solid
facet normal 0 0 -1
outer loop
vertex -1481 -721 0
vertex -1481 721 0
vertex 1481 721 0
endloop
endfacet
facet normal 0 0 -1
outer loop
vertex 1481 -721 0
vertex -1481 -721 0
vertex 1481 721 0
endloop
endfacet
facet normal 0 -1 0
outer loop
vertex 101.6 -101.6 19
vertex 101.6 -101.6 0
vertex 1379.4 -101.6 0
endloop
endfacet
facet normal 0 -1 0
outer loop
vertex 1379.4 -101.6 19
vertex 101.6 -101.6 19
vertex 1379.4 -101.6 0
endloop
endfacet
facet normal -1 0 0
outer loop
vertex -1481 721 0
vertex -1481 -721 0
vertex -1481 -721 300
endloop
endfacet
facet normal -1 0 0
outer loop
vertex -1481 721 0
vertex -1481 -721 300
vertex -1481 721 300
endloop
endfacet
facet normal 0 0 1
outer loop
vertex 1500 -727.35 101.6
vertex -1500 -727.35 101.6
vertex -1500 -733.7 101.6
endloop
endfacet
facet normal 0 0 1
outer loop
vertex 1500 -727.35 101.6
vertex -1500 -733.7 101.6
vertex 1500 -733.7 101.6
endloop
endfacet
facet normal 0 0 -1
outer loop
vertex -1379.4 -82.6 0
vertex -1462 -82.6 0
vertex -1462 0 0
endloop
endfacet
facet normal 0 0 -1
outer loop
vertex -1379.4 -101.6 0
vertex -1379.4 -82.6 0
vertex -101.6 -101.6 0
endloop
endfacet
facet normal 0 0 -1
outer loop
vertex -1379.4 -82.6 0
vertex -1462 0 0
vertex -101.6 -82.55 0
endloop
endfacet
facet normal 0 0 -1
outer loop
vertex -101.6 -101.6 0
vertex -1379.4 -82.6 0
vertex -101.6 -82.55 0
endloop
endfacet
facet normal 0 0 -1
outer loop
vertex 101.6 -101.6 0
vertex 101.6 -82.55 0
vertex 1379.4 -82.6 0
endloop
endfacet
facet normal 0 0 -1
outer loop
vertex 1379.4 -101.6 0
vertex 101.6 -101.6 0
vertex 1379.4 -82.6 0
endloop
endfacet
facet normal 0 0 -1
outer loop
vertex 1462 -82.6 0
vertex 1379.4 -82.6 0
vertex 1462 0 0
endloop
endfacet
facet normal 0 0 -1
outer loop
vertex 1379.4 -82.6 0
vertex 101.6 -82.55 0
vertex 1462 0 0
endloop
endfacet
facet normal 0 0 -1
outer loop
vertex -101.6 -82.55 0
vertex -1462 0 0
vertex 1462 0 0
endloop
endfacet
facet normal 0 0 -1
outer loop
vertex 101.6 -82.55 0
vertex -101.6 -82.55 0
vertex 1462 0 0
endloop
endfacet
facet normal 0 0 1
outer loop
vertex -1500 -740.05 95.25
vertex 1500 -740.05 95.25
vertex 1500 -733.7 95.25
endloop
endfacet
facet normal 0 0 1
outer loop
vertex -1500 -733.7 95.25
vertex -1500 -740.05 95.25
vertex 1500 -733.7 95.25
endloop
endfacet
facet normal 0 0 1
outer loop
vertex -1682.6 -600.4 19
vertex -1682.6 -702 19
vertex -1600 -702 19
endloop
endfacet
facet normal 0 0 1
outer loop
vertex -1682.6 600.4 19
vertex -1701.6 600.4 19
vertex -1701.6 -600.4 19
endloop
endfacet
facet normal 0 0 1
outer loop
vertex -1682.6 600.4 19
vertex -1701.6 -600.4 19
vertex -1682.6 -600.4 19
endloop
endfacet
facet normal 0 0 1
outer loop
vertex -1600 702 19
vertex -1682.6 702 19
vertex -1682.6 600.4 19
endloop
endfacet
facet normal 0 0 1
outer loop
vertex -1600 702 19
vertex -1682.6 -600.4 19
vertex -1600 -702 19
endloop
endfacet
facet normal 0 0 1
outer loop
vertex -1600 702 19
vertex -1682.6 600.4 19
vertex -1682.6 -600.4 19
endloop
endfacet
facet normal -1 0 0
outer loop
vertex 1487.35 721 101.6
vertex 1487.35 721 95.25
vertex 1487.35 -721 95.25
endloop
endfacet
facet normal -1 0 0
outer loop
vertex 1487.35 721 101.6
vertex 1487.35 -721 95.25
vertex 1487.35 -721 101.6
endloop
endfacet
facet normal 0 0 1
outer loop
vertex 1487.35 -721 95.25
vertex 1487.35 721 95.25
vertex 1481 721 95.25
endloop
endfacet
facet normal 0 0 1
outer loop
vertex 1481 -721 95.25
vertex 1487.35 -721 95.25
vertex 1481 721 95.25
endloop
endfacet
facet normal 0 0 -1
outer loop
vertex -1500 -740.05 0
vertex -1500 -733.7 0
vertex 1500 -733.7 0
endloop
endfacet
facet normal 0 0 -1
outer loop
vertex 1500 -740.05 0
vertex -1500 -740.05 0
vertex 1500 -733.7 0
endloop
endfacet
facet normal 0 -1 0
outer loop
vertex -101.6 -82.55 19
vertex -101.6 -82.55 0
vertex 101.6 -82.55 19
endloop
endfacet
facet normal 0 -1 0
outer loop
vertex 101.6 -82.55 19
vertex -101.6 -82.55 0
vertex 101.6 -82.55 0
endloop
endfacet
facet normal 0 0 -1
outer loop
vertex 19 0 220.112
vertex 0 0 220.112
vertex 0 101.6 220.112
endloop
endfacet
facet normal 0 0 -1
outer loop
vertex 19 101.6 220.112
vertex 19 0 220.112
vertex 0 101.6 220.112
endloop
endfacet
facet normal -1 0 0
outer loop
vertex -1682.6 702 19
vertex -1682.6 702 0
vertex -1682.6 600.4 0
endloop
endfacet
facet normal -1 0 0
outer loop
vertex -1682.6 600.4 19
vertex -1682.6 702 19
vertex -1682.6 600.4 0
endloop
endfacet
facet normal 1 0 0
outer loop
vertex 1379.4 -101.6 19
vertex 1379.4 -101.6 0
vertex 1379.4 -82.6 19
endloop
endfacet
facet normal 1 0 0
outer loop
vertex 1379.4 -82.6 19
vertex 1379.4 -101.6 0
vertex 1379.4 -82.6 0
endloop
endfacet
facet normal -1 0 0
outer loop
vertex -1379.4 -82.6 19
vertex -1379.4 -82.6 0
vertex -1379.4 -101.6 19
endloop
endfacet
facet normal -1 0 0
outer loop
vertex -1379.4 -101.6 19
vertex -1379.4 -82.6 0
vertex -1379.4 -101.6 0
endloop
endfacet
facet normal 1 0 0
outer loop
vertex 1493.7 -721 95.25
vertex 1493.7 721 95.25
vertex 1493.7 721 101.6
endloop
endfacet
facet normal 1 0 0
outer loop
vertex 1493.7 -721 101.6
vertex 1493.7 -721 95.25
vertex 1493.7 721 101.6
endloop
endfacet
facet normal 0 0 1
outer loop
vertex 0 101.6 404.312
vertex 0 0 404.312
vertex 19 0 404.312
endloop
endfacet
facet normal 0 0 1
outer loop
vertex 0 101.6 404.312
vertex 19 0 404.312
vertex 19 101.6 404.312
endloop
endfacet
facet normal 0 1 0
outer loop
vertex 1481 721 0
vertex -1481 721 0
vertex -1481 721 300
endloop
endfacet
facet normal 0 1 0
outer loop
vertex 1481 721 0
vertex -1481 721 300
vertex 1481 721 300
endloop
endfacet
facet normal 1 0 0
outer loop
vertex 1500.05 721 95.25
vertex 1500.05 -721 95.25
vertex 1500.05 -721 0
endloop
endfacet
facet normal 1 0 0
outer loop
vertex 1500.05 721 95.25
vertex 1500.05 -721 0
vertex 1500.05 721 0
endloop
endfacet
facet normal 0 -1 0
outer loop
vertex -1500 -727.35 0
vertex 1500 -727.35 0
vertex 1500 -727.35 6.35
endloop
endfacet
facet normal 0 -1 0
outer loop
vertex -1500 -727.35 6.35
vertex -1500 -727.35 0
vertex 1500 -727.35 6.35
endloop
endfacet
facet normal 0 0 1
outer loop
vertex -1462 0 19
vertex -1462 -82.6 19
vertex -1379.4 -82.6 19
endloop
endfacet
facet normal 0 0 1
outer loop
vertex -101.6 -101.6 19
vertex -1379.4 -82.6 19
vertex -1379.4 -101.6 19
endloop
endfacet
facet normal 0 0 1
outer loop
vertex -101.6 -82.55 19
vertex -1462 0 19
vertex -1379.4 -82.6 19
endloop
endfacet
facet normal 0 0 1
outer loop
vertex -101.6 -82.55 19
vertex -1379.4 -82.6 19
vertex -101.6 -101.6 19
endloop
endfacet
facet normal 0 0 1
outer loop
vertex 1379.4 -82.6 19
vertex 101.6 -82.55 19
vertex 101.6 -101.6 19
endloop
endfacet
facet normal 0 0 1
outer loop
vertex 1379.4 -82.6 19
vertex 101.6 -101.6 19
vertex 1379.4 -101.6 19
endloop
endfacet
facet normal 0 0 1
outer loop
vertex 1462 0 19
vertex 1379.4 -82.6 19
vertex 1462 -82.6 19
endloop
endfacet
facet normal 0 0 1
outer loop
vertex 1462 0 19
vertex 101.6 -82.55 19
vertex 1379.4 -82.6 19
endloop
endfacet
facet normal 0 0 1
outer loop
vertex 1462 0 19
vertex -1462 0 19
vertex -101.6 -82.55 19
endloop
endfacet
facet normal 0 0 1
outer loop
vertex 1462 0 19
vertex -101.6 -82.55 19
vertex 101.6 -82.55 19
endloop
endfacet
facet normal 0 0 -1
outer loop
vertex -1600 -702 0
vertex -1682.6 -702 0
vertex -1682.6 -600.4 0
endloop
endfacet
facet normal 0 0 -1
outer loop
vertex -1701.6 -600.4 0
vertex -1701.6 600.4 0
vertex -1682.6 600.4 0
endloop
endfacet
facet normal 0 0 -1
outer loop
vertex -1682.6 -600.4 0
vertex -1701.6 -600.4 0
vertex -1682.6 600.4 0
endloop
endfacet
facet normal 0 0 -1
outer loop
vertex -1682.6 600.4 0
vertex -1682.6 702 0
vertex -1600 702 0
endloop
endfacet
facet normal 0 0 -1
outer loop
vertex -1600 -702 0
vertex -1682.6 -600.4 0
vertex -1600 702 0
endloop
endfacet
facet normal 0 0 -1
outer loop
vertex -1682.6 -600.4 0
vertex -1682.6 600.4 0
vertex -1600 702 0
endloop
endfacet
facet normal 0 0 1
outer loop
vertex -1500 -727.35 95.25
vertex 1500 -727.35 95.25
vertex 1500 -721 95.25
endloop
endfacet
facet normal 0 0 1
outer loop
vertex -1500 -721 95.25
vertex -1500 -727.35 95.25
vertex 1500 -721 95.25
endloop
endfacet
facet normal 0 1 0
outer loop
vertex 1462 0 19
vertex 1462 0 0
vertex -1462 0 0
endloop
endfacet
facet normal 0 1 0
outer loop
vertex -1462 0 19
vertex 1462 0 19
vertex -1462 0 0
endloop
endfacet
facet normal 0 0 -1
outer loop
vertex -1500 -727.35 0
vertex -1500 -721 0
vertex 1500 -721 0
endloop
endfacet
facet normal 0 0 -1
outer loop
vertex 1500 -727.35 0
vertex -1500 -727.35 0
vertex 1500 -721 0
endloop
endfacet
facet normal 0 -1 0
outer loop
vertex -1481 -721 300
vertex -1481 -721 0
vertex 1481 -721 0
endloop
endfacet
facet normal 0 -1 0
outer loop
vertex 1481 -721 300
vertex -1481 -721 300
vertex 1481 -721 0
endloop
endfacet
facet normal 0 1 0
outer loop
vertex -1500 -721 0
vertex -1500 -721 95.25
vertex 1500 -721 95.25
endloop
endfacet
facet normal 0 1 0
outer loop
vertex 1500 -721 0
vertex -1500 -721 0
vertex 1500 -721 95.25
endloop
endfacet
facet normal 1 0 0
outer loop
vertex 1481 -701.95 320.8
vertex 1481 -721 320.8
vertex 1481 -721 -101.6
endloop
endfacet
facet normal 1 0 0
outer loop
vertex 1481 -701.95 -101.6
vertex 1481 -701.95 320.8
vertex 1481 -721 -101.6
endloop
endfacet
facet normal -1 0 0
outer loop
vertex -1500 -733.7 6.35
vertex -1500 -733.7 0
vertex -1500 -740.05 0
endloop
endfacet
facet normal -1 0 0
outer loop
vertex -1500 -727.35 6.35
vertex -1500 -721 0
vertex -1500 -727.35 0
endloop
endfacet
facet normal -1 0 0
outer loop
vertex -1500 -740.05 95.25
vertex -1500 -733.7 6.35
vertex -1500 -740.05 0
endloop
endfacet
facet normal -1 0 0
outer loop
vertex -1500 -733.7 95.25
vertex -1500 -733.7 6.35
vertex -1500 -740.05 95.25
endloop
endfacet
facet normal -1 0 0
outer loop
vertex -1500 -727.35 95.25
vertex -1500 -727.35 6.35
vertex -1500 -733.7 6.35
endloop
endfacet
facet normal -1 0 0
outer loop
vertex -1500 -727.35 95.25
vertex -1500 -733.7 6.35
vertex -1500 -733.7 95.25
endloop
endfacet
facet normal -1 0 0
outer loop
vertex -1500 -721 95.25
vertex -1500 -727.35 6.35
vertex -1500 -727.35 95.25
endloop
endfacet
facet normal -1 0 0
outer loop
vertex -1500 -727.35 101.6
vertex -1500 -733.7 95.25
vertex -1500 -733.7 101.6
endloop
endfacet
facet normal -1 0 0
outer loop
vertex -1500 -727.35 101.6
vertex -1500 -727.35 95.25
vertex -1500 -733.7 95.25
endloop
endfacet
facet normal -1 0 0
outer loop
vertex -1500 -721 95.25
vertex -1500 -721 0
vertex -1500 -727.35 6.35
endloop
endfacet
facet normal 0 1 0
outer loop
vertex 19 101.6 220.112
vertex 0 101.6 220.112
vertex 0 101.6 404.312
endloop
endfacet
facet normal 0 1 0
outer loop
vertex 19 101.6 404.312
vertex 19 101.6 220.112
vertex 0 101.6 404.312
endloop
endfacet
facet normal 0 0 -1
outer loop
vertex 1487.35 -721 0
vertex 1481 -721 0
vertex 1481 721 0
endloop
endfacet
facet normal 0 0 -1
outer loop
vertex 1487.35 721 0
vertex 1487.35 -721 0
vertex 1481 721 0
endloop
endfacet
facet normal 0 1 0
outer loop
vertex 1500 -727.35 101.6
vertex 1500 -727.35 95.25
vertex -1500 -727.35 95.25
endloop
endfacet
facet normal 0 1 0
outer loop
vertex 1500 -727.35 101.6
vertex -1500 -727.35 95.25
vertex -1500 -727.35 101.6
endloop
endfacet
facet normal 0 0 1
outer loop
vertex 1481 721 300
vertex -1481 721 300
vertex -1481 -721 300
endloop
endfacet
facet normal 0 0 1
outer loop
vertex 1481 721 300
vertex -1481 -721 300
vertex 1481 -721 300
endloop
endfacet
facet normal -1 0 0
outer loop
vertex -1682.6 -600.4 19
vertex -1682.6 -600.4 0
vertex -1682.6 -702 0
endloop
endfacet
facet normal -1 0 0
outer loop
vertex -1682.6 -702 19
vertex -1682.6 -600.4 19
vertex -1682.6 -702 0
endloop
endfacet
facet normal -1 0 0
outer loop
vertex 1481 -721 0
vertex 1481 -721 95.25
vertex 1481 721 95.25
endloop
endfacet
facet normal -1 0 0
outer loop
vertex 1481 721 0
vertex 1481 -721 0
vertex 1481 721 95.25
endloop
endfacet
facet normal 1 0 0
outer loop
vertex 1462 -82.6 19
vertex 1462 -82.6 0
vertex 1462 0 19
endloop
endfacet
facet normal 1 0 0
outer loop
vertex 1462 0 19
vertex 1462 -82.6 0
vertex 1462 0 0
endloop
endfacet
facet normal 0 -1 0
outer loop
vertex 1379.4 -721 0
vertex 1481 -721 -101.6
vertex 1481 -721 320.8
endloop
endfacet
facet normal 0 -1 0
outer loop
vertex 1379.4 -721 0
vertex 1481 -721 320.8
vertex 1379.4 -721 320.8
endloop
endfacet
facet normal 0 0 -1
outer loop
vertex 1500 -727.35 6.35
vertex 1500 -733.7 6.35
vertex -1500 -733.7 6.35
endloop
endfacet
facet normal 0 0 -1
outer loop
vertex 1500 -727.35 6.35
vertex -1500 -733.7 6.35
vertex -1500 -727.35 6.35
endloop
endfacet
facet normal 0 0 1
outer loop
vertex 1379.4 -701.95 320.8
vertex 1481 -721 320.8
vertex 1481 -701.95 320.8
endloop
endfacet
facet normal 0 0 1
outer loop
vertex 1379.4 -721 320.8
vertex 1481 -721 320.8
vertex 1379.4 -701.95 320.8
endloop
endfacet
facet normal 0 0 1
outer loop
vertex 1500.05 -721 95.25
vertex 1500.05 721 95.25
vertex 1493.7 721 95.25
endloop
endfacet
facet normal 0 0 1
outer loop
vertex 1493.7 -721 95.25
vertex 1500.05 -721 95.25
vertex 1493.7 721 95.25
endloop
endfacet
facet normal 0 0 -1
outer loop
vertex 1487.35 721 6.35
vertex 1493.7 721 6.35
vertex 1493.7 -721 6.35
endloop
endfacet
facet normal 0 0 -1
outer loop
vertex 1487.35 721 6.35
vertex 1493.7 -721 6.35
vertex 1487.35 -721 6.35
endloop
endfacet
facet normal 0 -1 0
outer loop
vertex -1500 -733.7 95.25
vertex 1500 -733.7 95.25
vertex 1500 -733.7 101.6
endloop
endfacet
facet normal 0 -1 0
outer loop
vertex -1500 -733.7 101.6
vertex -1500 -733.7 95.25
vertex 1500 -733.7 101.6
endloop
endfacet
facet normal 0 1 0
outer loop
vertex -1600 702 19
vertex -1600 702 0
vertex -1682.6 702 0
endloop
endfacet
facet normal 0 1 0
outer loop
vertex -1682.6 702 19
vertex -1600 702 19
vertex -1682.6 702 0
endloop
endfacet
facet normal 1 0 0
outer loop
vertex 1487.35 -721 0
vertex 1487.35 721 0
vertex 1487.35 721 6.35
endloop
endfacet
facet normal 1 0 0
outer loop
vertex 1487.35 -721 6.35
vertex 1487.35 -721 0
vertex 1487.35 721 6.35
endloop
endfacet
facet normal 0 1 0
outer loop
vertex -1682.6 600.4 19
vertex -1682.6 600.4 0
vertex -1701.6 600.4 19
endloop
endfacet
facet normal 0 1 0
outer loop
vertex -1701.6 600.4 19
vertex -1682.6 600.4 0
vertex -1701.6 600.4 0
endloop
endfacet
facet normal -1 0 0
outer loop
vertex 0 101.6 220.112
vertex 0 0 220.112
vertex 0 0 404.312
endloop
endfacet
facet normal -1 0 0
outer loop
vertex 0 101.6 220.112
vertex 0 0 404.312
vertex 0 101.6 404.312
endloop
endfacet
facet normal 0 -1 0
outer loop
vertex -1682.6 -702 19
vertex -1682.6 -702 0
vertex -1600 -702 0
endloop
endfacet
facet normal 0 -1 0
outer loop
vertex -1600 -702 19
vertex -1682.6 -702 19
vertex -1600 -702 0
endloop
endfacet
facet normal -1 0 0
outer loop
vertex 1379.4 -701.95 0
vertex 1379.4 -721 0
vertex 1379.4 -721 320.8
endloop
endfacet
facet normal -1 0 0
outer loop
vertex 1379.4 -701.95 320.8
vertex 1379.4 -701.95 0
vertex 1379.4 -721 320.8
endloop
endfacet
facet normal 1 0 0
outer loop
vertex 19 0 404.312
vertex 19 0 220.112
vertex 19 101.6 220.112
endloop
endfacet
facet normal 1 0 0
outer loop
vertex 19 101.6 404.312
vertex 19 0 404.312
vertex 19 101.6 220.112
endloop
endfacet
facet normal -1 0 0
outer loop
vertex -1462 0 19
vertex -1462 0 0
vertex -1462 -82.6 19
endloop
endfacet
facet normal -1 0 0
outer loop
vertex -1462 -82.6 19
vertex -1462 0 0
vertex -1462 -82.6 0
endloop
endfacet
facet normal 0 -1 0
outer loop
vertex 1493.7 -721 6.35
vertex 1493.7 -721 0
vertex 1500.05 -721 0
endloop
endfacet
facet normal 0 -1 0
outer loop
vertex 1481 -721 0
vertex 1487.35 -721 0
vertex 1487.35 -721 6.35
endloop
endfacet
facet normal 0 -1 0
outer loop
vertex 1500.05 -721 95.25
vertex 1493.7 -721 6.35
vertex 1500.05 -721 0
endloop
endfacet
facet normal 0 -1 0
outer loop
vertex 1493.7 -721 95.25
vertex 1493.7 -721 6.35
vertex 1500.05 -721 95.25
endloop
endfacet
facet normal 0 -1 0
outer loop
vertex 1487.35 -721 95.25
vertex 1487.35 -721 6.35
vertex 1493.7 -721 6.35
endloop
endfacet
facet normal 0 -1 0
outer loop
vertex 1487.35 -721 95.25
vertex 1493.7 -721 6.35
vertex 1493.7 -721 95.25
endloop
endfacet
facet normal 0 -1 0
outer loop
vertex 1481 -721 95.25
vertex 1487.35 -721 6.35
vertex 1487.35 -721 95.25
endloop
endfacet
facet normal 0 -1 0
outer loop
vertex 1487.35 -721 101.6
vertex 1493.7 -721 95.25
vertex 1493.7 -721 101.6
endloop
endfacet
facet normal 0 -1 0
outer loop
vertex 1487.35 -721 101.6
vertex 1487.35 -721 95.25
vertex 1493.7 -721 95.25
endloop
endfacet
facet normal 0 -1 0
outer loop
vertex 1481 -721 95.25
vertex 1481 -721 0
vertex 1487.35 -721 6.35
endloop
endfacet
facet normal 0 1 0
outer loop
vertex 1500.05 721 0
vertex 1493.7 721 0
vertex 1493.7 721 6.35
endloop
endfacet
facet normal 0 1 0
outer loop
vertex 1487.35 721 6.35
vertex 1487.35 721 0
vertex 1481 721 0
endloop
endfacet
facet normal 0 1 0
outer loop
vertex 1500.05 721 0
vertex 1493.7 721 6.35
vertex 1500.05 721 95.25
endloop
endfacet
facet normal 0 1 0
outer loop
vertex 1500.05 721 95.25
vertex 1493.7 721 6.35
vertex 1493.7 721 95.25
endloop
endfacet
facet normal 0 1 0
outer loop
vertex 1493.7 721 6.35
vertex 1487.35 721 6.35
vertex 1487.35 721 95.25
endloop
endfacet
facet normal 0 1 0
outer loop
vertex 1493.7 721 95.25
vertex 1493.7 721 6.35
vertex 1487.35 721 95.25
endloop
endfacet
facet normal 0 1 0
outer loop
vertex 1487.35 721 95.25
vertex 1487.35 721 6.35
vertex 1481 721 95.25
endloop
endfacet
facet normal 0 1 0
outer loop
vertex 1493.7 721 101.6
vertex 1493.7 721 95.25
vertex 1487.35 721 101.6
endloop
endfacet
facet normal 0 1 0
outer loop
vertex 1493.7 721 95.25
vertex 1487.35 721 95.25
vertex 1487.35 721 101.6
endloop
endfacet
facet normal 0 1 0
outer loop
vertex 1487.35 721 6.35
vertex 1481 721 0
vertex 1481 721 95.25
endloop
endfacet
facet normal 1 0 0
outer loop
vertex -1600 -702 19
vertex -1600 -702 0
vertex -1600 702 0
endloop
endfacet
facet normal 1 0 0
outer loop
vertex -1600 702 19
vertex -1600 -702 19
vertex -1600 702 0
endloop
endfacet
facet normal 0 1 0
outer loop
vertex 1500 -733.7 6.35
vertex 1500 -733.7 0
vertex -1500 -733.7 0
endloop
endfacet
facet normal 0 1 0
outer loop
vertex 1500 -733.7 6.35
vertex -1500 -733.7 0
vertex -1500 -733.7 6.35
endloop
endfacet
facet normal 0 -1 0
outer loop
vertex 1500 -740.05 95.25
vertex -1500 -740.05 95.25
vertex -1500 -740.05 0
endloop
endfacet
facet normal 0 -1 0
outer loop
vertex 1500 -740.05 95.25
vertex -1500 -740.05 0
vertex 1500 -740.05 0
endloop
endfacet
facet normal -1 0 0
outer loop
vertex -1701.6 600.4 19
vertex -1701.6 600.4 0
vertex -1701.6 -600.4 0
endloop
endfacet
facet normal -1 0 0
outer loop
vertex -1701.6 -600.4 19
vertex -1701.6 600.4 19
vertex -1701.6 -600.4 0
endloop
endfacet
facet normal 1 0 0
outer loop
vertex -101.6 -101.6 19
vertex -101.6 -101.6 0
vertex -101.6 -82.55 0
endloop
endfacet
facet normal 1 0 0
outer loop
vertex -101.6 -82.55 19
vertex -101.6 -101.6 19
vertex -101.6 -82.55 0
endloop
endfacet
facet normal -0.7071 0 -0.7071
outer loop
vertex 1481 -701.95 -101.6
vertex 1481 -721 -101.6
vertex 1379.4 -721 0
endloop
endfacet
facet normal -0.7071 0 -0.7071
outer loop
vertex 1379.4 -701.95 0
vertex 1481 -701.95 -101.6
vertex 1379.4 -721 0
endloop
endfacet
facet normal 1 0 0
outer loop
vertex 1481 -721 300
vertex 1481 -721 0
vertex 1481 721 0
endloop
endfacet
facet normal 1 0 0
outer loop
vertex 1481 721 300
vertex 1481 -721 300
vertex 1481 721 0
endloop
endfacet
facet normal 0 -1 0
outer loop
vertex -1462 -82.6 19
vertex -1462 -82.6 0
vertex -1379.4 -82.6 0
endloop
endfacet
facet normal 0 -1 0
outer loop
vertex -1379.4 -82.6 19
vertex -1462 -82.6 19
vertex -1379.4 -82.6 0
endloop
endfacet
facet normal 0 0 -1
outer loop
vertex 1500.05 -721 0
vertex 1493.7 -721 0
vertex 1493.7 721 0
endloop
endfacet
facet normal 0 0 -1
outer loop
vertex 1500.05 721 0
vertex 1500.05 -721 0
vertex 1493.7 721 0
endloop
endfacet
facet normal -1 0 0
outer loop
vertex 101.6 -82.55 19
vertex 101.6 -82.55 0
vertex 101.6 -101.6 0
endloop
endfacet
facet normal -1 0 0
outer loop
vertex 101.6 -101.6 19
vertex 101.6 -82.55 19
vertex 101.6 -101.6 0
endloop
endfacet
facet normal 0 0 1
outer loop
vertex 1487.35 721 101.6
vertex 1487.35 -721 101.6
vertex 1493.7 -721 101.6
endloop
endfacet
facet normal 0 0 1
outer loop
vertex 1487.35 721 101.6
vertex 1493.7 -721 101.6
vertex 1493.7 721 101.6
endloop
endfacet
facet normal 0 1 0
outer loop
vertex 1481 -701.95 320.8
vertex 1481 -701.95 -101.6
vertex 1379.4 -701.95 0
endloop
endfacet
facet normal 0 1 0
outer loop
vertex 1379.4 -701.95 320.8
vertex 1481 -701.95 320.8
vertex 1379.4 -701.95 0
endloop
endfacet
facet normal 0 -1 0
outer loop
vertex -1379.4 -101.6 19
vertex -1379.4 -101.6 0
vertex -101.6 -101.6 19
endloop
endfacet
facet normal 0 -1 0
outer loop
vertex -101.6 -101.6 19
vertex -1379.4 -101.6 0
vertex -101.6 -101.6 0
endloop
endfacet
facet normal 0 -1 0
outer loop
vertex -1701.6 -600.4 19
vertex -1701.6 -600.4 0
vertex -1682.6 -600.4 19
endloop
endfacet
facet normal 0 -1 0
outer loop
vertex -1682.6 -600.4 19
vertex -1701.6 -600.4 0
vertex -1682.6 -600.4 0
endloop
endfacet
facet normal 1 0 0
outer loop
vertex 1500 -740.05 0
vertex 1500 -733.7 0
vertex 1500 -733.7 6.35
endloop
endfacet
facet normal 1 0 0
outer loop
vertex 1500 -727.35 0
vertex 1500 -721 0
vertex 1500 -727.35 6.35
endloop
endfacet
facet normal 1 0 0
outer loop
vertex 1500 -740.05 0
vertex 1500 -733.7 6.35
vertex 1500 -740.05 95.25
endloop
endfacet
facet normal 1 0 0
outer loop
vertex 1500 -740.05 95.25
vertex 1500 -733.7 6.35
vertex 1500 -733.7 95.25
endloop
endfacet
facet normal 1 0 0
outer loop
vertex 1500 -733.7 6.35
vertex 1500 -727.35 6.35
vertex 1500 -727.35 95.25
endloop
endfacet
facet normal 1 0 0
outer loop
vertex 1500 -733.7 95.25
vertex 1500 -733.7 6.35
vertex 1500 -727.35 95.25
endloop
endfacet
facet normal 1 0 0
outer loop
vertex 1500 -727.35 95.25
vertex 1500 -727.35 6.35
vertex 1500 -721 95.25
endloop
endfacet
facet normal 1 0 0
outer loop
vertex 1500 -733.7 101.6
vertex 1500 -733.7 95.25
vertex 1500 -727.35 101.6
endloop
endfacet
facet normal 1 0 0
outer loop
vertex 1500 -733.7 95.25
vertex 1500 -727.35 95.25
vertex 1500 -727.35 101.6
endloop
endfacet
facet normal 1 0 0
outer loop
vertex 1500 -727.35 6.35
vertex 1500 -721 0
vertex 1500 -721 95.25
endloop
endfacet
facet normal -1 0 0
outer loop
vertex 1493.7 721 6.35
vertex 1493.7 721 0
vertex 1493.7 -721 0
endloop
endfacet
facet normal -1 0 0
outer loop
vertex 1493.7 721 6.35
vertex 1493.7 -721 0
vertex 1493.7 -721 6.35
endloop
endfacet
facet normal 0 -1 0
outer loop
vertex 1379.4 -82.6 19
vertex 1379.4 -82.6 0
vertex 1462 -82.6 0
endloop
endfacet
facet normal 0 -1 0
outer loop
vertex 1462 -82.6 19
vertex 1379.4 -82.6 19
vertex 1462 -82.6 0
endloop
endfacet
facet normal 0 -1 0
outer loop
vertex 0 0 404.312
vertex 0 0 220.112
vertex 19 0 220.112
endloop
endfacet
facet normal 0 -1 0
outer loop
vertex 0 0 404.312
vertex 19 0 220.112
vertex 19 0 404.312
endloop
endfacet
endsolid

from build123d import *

# Parameters (mm, degrees)
F2_W      = 2962
F2_H      = 1442
F3_DEPTH  = 300
F4_W      = 1442
F4_H      = 101.6
F5_DEPTH  = 19.05
F6_W      = 3000
F6_H      = 101.6
F7_DEPTH  = 19.05
F10_W     = 6.35
F10_H     = 6.35
F11_DEPTH = 3000
F12_W     = 6.35
F12_H     = 6.35
F13_DEPTH = 1442
F14_W     = 101.6
F14_H     = 300
F14_H_2   = 20.8
F15_DEPTH = 19.05
F17_DEPTH = 19
F19_DEPTH = 19
F20_W     = 101.6
F20_H     = 184.2
F21_DEPTH = 19


with BuildPart() as f3:
    # F2 (on Top) → F3 (new body)
    with BuildSketch(Plane.XY):
        Rectangle(F2_W, F2_H)
    extrude(amount=F3_DEPTH)


with BuildPart() as f5:
    # F4 (on offset) → F5 (new body)
    with BuildSketch(Plane.YZ.offset(1481)):
        with Locations((0, 50.8)):
            Rectangle(F4_W, F4_H)
    extrude(amount=F5_DEPTH)

    # F12 (on face) → F13 (cut, through all)
    with BuildSketch(Plane(origin=(0, 721, 0), x_dir=(-1, 0, 0), z_dir=(0, 1, 0))):
        with Locations((-1496.875, 98.425)):
            Rectangle(F12_W, F12_H)
        with Locations((-1484.175, 98.425)):
            Rectangle(F12_W, F12_H)
        with Locations((-1490.525, 3.175)):
            Rectangle(F12_W, F12_H)
    extrude(amount=-F13_DEPTH, mode=Mode.SUBTRACT)


with BuildPart() as f7:
    # F6 (on offset) → F7 (new body)
    with BuildSketch(Plane.XZ.offset(721)):
        with Locations((0, 50.8)):
            Rectangle(F6_W, F6_H)
    extrude(amount=F7_DEPTH)

    # F10 (on face) → F11 (cut, through all)
    with BuildSketch(Plane.YZ.offset(1500)):
        with Locations((-736.875, 98.425)):
            Rectangle(F10_W, F10_H)
        with Locations((-724.175, 98.425)):
            Rectangle(F10_W, F10_H)
        with Locations((-730.525, 3.175)):
            Rectangle(F10_W, F10_H)
    extrude(amount=-F11_DEPTH, mode=Mode.SUBTRACT)


with BuildPart() as f15:
    # F14 (on face) → F15 (new body)
    with BuildSketch(Plane(origin=(0, -721, 0), x_dir=(-1, 0, 0), z_dir=(0, 1, 0))):
        Polygon((-1481, -101.6), (-1379.4, 0), (-1481, 0), align=None)
        with Locations((-1430.2, 150)):
            Rectangle(F14_W, F14_H)
        with Locations((-1430.2, 310.4)):
            Rectangle(F14_W, F14_H_2)
    extrude(amount=F15_DEPTH)


with BuildPart() as f17:
    # F16 (on Top) → F17 (new body)
    with BuildSketch(Plane.XY):
        Polygon((1462, 0), (-1462, 0), (-1462, -82.6), (-1379.4, -82.6), (-1379.4, -101.6), (-101.6, -101.6), (-101.6, -82.55), (101.6, -82.55), (101.6, -101.6), (1379.4, -101.6), (1379.4, -82.6), (1462, -82.6), align=None)
    extrude(amount=F17_DEPTH)


with BuildPart() as f19:
    # F18 (on Top) → F19 (new body)
    with BuildSketch(Plane.XY):
        Polygon((-1682.6, -600.4), (-1682.6, -702), (-1600, -702), (-1600, 702), (-1682.6, 702), (-1682.6, 600.4), (-1701.6, 600.4), (-1701.6, -600.4), align=None)
    extrude(amount=F19_DEPTH)


with BuildPart() as f21:
    # F20 (on Right) → F21 (new body)
    with BuildSketch(Plane.YZ):
        with Locations((50.8, 312.212449)):
            Rectangle(F20_W, F20_H)
    extrude(amount=F21_DEPTH)


solid = Compound([f3.part, f5.part, f7.part, f15.part, f17.part, f19.part, f21.part])
